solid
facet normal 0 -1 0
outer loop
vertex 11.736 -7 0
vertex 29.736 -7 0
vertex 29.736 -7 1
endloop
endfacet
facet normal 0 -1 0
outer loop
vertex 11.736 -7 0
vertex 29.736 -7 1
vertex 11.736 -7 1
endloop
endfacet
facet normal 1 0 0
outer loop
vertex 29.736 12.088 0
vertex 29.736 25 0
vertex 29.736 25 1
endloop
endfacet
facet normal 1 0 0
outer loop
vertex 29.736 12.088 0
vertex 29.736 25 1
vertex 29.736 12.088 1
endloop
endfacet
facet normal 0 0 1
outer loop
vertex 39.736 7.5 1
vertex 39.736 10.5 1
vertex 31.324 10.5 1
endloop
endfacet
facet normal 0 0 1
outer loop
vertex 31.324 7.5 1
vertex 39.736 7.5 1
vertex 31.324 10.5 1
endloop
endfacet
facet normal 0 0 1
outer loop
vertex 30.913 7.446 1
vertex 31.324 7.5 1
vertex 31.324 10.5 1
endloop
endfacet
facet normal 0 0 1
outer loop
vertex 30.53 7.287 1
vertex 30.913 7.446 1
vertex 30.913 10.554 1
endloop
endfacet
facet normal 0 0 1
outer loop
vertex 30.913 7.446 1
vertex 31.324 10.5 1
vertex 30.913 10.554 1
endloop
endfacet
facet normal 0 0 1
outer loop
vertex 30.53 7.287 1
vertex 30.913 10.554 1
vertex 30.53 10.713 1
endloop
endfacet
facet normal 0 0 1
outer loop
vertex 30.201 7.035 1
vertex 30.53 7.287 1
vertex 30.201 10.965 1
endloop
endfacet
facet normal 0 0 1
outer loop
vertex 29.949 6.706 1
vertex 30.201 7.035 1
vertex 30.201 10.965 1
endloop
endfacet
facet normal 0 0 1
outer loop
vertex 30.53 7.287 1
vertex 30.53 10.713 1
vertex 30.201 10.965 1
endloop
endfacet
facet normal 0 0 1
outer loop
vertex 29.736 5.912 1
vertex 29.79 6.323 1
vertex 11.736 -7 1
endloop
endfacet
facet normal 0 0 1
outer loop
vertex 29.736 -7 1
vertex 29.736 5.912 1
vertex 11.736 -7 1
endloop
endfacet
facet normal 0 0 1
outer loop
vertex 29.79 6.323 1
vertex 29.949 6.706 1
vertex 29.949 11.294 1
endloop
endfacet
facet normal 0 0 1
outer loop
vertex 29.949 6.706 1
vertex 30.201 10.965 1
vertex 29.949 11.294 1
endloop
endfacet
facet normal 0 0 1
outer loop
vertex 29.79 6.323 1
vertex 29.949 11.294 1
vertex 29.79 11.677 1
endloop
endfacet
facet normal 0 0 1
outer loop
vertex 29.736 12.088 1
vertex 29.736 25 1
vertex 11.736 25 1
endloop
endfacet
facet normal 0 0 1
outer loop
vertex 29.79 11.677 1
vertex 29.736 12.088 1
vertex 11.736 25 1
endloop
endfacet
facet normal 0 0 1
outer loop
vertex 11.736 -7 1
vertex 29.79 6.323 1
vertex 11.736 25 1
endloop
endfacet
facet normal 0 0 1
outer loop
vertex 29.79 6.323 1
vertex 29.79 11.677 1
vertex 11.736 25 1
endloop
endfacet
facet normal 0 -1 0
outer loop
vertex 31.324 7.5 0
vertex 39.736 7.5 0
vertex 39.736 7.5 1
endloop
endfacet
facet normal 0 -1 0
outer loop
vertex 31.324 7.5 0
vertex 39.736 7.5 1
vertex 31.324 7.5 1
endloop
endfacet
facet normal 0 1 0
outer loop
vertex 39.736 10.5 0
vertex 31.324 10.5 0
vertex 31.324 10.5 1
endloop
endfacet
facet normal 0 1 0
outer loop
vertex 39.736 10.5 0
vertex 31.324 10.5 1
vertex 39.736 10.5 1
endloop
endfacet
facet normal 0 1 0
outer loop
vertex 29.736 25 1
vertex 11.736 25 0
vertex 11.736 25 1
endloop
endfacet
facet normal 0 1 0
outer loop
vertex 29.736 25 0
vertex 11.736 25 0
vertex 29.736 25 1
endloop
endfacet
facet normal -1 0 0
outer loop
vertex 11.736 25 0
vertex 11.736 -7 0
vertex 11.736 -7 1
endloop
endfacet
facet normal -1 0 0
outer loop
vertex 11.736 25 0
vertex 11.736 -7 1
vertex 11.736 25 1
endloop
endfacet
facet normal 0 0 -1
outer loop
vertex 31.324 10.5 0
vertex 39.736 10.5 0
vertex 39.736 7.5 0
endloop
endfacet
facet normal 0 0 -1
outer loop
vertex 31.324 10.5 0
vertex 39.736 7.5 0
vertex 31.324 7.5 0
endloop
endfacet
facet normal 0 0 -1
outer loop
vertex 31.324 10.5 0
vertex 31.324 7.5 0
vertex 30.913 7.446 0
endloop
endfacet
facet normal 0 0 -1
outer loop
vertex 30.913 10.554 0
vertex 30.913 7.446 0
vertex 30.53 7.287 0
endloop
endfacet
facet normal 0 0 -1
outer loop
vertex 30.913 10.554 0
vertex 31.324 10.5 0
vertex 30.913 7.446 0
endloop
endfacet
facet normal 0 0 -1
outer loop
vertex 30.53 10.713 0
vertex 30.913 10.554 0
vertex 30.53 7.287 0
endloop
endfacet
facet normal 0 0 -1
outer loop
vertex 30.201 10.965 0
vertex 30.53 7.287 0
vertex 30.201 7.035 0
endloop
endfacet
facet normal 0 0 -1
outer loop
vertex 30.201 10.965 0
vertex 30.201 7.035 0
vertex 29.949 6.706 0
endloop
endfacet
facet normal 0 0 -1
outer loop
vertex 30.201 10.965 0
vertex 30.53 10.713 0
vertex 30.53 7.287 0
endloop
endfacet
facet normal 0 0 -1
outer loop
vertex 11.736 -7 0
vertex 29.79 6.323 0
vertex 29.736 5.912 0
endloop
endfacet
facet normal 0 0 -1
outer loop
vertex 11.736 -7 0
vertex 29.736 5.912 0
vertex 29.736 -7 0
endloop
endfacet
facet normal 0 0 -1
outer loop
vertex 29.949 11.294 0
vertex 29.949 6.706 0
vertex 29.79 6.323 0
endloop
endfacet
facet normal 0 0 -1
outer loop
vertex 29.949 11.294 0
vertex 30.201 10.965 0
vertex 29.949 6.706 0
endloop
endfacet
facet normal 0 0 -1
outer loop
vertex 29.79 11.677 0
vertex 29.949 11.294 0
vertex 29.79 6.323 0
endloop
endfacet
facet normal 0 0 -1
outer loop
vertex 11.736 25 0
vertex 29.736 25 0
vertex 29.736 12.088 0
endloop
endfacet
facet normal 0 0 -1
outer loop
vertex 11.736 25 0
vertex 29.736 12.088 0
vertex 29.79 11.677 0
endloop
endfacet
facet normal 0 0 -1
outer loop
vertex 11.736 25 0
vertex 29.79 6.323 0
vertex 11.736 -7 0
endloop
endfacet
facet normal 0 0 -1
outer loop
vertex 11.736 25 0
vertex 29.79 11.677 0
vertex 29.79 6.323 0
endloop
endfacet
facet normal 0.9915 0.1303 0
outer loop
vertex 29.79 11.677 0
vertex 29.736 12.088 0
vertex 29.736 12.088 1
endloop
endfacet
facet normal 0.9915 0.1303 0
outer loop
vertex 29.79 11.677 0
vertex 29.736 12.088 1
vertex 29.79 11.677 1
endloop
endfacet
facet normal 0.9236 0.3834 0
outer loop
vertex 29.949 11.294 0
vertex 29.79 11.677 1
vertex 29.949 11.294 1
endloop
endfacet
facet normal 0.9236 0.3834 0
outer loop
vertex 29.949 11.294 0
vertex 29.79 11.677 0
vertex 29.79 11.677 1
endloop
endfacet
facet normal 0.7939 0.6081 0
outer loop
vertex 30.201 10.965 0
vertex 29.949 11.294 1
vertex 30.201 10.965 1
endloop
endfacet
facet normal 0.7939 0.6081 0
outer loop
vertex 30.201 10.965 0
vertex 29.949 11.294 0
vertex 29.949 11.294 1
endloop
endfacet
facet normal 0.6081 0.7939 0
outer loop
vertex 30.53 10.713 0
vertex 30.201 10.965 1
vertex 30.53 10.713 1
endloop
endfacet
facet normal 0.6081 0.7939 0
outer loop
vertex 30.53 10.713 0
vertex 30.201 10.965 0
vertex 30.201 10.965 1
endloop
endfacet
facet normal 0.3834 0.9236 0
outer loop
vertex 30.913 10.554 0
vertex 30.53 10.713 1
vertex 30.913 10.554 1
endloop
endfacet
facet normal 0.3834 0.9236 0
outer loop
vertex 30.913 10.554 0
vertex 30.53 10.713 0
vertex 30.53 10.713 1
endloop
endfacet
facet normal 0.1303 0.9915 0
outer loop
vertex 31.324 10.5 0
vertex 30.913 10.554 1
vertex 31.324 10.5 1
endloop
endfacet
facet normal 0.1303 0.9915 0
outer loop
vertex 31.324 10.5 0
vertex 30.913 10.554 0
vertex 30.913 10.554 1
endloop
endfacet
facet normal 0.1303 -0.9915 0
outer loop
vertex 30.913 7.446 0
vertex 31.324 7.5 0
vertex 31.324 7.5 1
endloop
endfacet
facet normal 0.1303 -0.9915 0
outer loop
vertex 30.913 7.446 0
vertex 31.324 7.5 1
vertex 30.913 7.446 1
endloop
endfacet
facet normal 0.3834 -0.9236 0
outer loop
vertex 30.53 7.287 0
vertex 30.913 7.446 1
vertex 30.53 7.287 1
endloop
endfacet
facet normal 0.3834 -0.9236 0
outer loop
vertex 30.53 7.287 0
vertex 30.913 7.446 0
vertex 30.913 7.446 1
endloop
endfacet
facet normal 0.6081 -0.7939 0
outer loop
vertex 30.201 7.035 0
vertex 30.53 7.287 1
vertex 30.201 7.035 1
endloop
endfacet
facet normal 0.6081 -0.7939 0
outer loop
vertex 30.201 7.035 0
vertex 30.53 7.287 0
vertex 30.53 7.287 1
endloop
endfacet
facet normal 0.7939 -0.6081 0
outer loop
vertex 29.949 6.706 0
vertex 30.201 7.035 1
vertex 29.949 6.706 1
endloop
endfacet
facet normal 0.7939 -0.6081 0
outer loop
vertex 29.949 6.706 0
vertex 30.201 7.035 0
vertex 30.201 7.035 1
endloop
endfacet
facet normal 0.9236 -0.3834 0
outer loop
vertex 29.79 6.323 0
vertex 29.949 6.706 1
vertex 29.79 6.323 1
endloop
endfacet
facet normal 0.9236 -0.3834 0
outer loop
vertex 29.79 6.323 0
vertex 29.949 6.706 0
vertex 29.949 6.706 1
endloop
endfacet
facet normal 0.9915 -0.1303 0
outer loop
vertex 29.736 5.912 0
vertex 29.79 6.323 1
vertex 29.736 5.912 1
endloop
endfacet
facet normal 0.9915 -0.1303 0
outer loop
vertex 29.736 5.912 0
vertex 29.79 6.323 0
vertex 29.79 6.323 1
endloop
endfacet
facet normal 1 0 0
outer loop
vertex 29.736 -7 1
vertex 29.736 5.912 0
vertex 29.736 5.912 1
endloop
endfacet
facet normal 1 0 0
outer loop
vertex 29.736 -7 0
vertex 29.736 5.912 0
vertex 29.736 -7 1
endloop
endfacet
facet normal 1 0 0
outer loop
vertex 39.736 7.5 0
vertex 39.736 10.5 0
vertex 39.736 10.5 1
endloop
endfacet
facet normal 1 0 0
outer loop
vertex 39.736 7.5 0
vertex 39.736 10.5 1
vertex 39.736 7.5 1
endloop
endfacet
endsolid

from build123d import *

# Parameters (mm, degrees)
BOSS_EXTRUDE1_DEPTH = 1


with BuildPart() as part:
    # Sketch1 → Boss-Extrude1 (new body)
    with BuildSketch(Plane.XY):
        with BuildLine():
            Line((29.736292646, -7), (11.736292646, -7))
            Line((11.736292646, -7), (11.736292646, 25))
            Line((11.736292646, 25), (29.736292646, 25))
            Line((29.736292646, 25), (29.736292646, 12.0875))
            ThreePointArc((29.736292646, 12.0875), (30.201260631, 10.964967985), (31.323792646, 10.5))
            Line((31.323792646, 10.5), (39.736292646, 10.5))
            Line((39.736292646, 10.5), (39.736292646, 7.5))
            Line((39.736292646, 7.5), (31.323792646, 7.5))
            ThreePointArc((31.323792646, 7.5), (30.201260631, 7.035032015), (29.736292646, 5.9125))
            Line((29.736292646, 5.9125), (29.736292646, -7))
        make_face()
    extrude(amount=BOSS_EXTRUDE1_DEPTH)


solid = part.part
